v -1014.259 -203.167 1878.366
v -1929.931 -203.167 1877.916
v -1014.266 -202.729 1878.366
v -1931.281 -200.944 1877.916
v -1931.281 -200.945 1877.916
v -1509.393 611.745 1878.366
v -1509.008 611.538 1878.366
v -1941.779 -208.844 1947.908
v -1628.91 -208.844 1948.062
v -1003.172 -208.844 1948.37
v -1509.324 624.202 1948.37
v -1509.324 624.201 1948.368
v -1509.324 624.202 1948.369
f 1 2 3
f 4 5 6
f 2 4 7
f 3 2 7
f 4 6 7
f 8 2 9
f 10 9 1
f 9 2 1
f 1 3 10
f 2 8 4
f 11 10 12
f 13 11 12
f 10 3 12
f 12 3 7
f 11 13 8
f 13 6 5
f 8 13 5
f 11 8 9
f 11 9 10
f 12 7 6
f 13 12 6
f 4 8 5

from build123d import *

# Parameters (mm, degrees)
BOSS_EXTRUDE1_DEPTH = 70
CHAMFER1_SIZE2      = 5.656659752
CHAMFER1_SIZE       = 70
CHAMFER2_SIZE2      = 5.656659752
CHAMFER2_SIZE       = 70
CHAMFER3_SIZE2      = 6.345862846
CHAMFER3_SIZE       = 70
SKETCH3_W           = 71.265106757
SKETCH3_H           = 1.348372647
CUT_EXTRUDE1_DEPTH  = 10
SKETCH4_W           = 97.217574519
SKETCH4_H           = 25.906089707
CUT_EXTRUDE2_DEPTH  = 10
CUT_EXTRUDE3_DEPTH  = 15


with BuildPart() as part:
    # Sketch1 → Boss-Extrude1 (new body)
    with BuildSketch(Plane(origin=(-0.957874252, -0.581996614, 1948.924528972), x_dir=(0.9999998792194947, -1.4677051691166262e-07, 0.0004914885295678381), z_dir=(-0.0004914885514824738, -0.00029862445089364614, 0.999999834631207))):
        Polygon((-1508.366336361, 624.783470122), (-1940.821133222, -208.262480206), (-1002.214342981, -208.262411326), align=None)
    extrude(amount=-BOSS_EXTRUDE1_DEPTH)

    # Chamfer1
    chamfer1_edges = [part.edges().sort_by_distance(p)[0] for p in [
        (-1725.516996548, 207.69964589, 1878.139114193),
    ]]
    chamfer1_side = [part.faces().sort_by_distance(p)[0] for p in [
        (-1725.517052151, 207.699612105, 1878.252247369),
    ]]
    chamfer(chamfer1_edges, length=CHAMFER1_SIZE - 0.0001, length2=CHAMFER1_SIZE2 - 0.0001, reference=chamfer1_side[0])  # a hair under: the kernel refuses the full size

    # Chamfer2
    chamfer2_edges = [part.edges().sort_by_distance(p)[0] for p in [
        (-1469.254360498, -208.82331364, 1878.140680405),
    ]]
    chamfer2_side = [part.faces().sort_by_distance(p)[0] for p in [
        (-1469.254416102, -208.823347425, 1878.253813581),
    ]]
    chamfer(chamfer2_edges, length=CHAMFER2_SIZE - 0.0001, length2=CHAMFER2_SIZE2 - 0.0001, reference=chamfer2_side[0])  # a hair under: the kernel refuses the full size

    # Chamfer3
    chamfer3_edges = [part.edges().sort_by_distance(p)[0] for p in [
        (-1256.21365811, 207.69961145, 1878.369771439),
    ]]
    chamfer3_side = [part.faces().sort_by_distance(p)[0] for p in [
        (-1256.213720488, 207.699573549, 1878.496688675),
    ]]
    chamfer(chamfer3_edges, length=CHAMFER3_SIZE - 0.0001, length2=CHAMFER3_SIZE2 - 0.0001, reference=chamfer3_side[0])  # a hair under: the kernel refuses the full size

    # Sketch3 → Cut-Extrude1 (cut)
    with BuildSketch(Plane(origin=(-1471.025902014, 77.181437246, -1001.088177066), x_dir=(-0.012766042139118148, 0.1823400765961239, 0.9831526456430975), z_dir=(0.4685062593771071, 0.8697178350344407, -0.1552184665156707))):
        with Locations((2964.367143604, -0.674186324)):
            Rectangle(SKETCH3_W, SKETCH3_H)
    extrude(amount=CUT_EXTRUDE1_DEPTH, mode=Mode.SUBTRACT)

    # Sketch4 → Cut-Extrude2 (cut)
    with BuildSketch(Plane(origin=(-1471.025902014, 77.181437246, -1001.088177066), x_dir=(0.15595126860972144, -0.09534189626809239, 0.9831526456430979), z_dir=(-0.9877647491052985, -0.015100598579889693, 0.155218466515669))):
        with Locations((2960.985531457, 3.24314791)):
            Rectangle(SKETCH4_W, SKETCH4_H)
    extrude(amount=-CUT_EXTRUDE2_DEPTH, mode=Mode.SUBTRACT)

    # 3DSketch1 → Cut-Extrude3 (cut, along a direction that is not the sketch's normal)
    with BuildSketch(Plane(origin=(-1931.280839181, -200.944485541, 1877.915952454), x_dir=(-0.14741205849129177, -0.11092760059742722, 0.9828350586121039), z_dir=(0.8400877812574963, 0.510430510798338, 0.18361158304422126))):
        Polygon((0, 0), (0.047467536, 2.599718778), (71.214892371, 0), align=None)
    extrude(amount=-CUT_EXTRUDE3_DEPTH, dir=(-0.0004914885514824738, -0.0002986244508937508, 0.9999998346312069), mode=Mode.SUBTRACT)


solid = part.part
